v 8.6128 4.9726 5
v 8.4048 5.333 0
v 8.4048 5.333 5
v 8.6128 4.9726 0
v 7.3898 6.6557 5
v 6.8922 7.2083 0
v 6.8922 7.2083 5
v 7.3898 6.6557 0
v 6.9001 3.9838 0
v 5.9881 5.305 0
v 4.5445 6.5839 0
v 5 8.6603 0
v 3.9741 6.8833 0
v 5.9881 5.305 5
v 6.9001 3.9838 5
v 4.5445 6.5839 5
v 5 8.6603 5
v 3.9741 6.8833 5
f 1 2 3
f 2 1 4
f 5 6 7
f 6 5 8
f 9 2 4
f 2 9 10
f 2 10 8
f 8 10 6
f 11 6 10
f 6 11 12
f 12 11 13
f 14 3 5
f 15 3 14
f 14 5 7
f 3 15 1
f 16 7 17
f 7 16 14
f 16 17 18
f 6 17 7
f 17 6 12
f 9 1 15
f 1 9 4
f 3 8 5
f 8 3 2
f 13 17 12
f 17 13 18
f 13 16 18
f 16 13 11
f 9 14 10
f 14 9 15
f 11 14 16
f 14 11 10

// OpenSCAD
module sector(radius, height, start, end) {
  intersection() {
    cylinder(r=radius, h=height);
    rotate([0,0,start])
    rotate_extrude(angle=end-start) {
      square([radius,height]);
    }
  }
}

module arc(inner, outer, height, start, end) {
  difference(){
    sector(outer,height,start,end);
    sector(inner,height,0,360);
  }
}

arc(8,10,5,30,60);
